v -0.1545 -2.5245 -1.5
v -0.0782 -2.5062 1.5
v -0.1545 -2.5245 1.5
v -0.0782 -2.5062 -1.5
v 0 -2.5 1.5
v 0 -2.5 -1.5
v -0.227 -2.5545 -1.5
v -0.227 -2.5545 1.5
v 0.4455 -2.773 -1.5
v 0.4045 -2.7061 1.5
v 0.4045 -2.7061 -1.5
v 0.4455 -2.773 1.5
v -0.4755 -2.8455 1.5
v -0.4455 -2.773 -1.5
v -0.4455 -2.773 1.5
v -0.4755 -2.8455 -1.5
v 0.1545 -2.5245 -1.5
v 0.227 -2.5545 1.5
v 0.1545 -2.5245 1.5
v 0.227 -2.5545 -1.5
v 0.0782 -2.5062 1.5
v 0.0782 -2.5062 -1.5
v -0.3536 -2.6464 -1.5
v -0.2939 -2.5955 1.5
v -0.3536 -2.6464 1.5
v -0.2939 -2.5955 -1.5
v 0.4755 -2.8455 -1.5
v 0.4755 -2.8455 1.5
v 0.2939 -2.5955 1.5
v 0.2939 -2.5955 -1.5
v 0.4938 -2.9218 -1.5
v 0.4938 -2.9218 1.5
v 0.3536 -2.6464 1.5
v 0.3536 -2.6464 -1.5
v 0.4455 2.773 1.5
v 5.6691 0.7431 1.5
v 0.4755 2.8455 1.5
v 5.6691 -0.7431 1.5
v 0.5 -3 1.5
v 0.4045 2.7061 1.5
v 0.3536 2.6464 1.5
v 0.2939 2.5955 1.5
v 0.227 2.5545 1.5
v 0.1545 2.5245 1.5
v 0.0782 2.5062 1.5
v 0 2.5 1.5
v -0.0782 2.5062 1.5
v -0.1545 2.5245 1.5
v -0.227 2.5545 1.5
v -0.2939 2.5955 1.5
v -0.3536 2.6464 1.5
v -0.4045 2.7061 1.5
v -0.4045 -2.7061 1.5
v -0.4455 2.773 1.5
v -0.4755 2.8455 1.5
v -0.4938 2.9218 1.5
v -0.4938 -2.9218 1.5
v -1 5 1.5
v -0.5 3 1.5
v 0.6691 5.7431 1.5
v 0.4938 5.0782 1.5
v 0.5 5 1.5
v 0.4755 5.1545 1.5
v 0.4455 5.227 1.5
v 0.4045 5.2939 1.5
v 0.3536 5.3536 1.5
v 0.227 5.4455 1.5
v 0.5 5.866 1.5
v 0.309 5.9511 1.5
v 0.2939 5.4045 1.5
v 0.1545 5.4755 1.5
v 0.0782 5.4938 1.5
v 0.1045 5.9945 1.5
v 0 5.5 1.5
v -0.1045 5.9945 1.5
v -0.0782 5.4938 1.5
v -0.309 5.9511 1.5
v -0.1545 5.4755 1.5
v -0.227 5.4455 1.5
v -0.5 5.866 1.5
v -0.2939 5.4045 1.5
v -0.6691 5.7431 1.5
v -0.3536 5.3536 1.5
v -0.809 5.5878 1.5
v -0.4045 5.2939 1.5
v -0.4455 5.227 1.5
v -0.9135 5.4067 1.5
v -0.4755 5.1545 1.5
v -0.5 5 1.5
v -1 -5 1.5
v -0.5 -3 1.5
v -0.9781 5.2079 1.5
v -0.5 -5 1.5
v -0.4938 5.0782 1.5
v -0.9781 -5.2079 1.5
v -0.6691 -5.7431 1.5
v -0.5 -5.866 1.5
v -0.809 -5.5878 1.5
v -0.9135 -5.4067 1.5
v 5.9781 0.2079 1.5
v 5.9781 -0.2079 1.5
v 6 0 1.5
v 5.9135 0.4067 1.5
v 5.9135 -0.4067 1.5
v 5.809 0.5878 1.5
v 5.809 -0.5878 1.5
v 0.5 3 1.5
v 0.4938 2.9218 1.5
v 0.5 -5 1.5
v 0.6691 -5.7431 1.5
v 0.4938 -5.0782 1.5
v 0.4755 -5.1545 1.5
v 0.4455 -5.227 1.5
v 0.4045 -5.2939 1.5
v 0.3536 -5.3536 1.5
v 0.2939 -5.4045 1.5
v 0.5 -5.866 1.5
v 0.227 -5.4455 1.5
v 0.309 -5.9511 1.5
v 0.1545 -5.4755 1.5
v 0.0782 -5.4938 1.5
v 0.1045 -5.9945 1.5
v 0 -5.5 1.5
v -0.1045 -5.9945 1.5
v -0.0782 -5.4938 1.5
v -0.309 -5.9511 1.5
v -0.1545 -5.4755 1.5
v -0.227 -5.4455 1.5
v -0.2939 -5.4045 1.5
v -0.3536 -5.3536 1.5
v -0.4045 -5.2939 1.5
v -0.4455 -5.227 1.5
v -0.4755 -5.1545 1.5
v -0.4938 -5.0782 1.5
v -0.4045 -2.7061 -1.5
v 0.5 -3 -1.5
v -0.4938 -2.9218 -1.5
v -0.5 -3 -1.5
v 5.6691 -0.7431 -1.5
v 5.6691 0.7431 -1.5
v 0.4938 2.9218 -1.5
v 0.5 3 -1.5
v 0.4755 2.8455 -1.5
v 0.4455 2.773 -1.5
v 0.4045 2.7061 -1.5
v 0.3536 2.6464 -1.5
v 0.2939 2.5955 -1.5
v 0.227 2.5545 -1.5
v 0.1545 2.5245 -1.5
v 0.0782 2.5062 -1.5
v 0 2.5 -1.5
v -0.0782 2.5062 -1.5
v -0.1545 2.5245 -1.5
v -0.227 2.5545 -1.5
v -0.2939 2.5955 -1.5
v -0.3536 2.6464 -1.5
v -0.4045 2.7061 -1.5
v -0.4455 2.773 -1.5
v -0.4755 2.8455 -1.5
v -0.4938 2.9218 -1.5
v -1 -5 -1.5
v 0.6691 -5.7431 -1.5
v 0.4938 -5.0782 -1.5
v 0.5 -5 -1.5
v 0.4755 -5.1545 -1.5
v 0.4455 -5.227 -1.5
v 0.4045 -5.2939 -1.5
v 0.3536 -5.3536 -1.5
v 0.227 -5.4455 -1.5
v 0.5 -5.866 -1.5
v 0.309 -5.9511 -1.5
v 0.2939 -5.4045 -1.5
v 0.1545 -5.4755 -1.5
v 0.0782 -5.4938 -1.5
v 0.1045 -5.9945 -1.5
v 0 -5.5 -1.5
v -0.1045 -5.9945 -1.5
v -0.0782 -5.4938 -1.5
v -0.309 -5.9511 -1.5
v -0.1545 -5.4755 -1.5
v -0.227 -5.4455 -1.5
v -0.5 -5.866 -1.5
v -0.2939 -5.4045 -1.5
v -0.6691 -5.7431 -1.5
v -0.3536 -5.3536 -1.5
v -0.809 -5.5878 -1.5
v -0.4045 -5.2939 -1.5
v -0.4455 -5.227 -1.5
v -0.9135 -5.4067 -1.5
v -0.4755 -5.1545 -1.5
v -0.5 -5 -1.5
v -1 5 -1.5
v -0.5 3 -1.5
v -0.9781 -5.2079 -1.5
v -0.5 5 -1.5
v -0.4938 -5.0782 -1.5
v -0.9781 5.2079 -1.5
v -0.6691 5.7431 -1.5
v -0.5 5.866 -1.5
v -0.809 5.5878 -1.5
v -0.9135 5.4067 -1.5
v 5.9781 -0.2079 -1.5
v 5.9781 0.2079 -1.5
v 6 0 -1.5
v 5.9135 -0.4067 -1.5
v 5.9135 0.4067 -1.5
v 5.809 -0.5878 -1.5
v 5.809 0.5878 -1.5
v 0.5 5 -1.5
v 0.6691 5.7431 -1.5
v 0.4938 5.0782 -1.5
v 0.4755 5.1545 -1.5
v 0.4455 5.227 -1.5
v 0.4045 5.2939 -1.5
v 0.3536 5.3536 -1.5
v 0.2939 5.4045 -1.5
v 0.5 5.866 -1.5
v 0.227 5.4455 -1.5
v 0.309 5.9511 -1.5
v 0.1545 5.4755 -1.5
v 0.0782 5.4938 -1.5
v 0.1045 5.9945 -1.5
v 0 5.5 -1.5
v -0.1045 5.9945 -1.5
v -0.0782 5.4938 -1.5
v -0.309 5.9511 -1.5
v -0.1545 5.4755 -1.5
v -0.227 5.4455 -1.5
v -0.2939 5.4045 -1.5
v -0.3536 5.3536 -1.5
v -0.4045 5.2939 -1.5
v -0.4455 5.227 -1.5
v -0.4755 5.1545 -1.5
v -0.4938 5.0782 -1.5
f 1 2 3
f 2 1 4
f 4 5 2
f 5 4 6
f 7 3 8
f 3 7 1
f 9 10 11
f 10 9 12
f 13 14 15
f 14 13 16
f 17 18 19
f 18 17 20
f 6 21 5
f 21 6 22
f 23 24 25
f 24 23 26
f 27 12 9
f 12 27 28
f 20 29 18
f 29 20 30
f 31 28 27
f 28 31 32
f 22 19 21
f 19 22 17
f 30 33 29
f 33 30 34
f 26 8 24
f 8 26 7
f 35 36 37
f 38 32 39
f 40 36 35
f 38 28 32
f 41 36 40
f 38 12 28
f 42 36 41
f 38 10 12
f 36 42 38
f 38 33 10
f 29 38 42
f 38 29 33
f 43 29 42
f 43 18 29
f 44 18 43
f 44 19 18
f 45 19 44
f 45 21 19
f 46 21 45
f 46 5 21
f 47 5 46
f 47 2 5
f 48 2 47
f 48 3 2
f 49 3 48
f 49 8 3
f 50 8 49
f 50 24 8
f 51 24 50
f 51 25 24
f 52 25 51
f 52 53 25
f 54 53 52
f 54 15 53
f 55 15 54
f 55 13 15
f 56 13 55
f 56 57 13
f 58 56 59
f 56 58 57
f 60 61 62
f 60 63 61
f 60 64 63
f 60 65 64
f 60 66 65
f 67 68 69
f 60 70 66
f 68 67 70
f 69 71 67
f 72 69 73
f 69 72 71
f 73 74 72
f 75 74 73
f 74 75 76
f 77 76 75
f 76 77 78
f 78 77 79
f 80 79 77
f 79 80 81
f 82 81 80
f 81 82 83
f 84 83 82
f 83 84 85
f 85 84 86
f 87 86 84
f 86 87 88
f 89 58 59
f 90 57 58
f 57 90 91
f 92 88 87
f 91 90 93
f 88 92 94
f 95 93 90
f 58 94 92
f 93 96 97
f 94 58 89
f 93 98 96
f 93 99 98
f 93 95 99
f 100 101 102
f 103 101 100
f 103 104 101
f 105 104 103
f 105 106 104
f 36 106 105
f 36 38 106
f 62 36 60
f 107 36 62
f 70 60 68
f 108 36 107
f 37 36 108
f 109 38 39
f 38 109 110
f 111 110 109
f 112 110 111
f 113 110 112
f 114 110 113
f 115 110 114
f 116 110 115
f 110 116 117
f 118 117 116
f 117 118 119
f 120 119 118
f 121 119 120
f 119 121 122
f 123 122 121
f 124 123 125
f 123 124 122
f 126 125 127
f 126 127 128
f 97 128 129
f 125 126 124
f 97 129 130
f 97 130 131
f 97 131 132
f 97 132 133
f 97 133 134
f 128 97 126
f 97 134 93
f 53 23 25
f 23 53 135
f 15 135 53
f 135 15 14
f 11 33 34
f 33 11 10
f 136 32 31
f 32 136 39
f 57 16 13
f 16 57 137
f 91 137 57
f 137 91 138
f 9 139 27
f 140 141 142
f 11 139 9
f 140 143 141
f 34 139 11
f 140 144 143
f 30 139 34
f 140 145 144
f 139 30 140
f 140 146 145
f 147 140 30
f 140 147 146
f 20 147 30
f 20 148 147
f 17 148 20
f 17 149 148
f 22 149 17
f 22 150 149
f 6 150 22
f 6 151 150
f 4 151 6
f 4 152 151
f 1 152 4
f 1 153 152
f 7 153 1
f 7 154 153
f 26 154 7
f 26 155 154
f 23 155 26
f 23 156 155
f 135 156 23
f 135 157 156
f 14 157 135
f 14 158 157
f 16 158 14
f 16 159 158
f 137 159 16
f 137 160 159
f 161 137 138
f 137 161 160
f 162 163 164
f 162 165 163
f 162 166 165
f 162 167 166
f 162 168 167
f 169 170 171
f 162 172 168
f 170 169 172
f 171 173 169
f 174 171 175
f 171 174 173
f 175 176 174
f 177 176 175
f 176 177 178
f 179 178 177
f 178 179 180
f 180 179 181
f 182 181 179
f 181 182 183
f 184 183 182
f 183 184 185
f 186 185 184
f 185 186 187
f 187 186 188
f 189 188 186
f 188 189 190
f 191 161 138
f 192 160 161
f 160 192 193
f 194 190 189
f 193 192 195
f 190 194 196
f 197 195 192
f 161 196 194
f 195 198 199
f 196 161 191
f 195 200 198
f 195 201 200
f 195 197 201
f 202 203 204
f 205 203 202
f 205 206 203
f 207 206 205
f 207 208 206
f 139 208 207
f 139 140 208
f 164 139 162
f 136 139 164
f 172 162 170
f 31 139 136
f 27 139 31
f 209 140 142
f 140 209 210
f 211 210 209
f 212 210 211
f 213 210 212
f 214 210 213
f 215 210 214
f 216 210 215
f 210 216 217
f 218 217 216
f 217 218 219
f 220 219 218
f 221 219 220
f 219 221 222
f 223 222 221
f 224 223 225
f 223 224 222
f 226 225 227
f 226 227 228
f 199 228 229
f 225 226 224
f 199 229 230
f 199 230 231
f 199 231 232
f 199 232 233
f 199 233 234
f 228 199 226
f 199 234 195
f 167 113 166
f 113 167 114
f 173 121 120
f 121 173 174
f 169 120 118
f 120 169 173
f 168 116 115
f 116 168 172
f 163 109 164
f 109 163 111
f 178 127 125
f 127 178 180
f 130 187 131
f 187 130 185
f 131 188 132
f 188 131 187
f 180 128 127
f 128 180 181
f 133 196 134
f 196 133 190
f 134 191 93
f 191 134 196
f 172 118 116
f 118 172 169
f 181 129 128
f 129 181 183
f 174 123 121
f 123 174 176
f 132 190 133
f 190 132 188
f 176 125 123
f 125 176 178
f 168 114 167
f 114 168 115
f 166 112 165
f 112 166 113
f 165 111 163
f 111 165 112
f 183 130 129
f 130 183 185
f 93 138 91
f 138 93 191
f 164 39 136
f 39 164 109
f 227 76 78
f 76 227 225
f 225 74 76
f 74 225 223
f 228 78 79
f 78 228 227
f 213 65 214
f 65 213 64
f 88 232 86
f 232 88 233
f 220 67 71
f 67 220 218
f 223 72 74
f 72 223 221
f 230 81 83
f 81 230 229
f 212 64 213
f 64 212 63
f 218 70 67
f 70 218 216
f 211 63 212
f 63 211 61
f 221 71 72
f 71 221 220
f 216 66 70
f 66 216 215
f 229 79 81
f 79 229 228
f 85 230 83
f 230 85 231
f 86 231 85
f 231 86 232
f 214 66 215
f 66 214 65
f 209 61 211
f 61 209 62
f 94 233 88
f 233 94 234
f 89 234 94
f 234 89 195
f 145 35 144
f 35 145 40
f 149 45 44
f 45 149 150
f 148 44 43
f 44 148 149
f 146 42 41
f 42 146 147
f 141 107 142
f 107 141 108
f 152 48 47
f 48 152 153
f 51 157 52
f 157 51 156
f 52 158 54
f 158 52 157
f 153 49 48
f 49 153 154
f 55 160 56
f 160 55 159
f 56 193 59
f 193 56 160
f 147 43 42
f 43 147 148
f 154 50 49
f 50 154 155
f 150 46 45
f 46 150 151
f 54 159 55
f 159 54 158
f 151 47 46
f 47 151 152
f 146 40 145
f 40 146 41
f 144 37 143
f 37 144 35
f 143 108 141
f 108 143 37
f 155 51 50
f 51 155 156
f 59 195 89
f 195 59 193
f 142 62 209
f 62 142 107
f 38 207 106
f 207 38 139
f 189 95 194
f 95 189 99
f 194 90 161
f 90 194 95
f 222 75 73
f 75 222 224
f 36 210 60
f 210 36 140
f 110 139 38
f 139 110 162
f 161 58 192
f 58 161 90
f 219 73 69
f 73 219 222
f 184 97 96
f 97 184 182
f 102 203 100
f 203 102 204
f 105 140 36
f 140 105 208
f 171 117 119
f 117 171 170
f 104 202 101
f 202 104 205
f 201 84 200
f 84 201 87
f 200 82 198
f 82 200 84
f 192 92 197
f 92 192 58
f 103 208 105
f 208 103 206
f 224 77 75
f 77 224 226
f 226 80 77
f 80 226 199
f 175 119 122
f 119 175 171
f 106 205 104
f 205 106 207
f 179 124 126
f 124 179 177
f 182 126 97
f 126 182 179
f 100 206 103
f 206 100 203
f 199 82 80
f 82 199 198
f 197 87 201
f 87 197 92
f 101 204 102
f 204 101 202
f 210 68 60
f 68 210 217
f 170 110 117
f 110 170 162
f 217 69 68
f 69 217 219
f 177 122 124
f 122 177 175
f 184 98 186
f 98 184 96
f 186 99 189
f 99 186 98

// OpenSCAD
module Mech_Piece_01(){

Key_Lenght = 10;
Key_Height = 10;
Key_Width = 15;

color("#a8b0b2")
union(){
    translate([1,0,0])
    cylinder(3,0.5,0.5, $fn=40, center=true);

    translate([-1,0,0])
    cylinder(3,0.5,0.5, $fn=40, center=true);

    cube([2,1,3],center = true);
}


}

difference(){

linear_extrude(height=3, center=true)
hull(){
translate([5,0,0])
circle(r = 1, $fn = 30);

translate([0,5,0])
circle(r = 1, $fn = 30);

translate([0,-5,0])
circle(r = 1, $fn = 30);

}


translate([0,-4,0]){
rotate([0,0,90])
Mech_Piece_01();
}

translate([0,4,0]){
rotate([0,0,90])
Mech_Piece_01();
}

}


// Written by Nicolì Angelo (Gengio) 2024: 
// MIT License

//Permission is hereby granted, free of charge, to any person obtaining a copy of this software and associated documentation files (the "Software"), to deal in the Software without restriction, including without limitation the rights to use, copy, modify, merge, publish, distribute, sublicense, and/or sell copies of the Software, and to permit persons to whom the Software is furnished to do so, subject to the following conditions:

//The above copyright notice and this permission notice shall be included in all copies or substantial portions of the Software.

//THE SOFTWARE IS PROVIDED "AS IS", WITHOUT WARRANTY OF ANY KIND, EXPRESS OR IMPLIED, INCLUDING BUT NOT LIMITED TO THE WARRANTIES OF MERCHANTABILITY, FITNESS FOR A PARTICULAR PURPOSE AND NONINFRINGEMENT. IN NO EVENT SHALL THE AUTHORS OR COPYRIGHT HOLDERS BE LIABLE FOR ANY CLAIM, DAMAGES OR OTHER LIABILITY, WHETHER IN AN ACTION OF CONTRACT, TORT OR OTHERWISE, ARISING FROM, OUT OF OR IN CONNECTION WITH THE SOFTWARE OR THE USE OR OTHER DEALINGS IN THE SOFTWARE.
